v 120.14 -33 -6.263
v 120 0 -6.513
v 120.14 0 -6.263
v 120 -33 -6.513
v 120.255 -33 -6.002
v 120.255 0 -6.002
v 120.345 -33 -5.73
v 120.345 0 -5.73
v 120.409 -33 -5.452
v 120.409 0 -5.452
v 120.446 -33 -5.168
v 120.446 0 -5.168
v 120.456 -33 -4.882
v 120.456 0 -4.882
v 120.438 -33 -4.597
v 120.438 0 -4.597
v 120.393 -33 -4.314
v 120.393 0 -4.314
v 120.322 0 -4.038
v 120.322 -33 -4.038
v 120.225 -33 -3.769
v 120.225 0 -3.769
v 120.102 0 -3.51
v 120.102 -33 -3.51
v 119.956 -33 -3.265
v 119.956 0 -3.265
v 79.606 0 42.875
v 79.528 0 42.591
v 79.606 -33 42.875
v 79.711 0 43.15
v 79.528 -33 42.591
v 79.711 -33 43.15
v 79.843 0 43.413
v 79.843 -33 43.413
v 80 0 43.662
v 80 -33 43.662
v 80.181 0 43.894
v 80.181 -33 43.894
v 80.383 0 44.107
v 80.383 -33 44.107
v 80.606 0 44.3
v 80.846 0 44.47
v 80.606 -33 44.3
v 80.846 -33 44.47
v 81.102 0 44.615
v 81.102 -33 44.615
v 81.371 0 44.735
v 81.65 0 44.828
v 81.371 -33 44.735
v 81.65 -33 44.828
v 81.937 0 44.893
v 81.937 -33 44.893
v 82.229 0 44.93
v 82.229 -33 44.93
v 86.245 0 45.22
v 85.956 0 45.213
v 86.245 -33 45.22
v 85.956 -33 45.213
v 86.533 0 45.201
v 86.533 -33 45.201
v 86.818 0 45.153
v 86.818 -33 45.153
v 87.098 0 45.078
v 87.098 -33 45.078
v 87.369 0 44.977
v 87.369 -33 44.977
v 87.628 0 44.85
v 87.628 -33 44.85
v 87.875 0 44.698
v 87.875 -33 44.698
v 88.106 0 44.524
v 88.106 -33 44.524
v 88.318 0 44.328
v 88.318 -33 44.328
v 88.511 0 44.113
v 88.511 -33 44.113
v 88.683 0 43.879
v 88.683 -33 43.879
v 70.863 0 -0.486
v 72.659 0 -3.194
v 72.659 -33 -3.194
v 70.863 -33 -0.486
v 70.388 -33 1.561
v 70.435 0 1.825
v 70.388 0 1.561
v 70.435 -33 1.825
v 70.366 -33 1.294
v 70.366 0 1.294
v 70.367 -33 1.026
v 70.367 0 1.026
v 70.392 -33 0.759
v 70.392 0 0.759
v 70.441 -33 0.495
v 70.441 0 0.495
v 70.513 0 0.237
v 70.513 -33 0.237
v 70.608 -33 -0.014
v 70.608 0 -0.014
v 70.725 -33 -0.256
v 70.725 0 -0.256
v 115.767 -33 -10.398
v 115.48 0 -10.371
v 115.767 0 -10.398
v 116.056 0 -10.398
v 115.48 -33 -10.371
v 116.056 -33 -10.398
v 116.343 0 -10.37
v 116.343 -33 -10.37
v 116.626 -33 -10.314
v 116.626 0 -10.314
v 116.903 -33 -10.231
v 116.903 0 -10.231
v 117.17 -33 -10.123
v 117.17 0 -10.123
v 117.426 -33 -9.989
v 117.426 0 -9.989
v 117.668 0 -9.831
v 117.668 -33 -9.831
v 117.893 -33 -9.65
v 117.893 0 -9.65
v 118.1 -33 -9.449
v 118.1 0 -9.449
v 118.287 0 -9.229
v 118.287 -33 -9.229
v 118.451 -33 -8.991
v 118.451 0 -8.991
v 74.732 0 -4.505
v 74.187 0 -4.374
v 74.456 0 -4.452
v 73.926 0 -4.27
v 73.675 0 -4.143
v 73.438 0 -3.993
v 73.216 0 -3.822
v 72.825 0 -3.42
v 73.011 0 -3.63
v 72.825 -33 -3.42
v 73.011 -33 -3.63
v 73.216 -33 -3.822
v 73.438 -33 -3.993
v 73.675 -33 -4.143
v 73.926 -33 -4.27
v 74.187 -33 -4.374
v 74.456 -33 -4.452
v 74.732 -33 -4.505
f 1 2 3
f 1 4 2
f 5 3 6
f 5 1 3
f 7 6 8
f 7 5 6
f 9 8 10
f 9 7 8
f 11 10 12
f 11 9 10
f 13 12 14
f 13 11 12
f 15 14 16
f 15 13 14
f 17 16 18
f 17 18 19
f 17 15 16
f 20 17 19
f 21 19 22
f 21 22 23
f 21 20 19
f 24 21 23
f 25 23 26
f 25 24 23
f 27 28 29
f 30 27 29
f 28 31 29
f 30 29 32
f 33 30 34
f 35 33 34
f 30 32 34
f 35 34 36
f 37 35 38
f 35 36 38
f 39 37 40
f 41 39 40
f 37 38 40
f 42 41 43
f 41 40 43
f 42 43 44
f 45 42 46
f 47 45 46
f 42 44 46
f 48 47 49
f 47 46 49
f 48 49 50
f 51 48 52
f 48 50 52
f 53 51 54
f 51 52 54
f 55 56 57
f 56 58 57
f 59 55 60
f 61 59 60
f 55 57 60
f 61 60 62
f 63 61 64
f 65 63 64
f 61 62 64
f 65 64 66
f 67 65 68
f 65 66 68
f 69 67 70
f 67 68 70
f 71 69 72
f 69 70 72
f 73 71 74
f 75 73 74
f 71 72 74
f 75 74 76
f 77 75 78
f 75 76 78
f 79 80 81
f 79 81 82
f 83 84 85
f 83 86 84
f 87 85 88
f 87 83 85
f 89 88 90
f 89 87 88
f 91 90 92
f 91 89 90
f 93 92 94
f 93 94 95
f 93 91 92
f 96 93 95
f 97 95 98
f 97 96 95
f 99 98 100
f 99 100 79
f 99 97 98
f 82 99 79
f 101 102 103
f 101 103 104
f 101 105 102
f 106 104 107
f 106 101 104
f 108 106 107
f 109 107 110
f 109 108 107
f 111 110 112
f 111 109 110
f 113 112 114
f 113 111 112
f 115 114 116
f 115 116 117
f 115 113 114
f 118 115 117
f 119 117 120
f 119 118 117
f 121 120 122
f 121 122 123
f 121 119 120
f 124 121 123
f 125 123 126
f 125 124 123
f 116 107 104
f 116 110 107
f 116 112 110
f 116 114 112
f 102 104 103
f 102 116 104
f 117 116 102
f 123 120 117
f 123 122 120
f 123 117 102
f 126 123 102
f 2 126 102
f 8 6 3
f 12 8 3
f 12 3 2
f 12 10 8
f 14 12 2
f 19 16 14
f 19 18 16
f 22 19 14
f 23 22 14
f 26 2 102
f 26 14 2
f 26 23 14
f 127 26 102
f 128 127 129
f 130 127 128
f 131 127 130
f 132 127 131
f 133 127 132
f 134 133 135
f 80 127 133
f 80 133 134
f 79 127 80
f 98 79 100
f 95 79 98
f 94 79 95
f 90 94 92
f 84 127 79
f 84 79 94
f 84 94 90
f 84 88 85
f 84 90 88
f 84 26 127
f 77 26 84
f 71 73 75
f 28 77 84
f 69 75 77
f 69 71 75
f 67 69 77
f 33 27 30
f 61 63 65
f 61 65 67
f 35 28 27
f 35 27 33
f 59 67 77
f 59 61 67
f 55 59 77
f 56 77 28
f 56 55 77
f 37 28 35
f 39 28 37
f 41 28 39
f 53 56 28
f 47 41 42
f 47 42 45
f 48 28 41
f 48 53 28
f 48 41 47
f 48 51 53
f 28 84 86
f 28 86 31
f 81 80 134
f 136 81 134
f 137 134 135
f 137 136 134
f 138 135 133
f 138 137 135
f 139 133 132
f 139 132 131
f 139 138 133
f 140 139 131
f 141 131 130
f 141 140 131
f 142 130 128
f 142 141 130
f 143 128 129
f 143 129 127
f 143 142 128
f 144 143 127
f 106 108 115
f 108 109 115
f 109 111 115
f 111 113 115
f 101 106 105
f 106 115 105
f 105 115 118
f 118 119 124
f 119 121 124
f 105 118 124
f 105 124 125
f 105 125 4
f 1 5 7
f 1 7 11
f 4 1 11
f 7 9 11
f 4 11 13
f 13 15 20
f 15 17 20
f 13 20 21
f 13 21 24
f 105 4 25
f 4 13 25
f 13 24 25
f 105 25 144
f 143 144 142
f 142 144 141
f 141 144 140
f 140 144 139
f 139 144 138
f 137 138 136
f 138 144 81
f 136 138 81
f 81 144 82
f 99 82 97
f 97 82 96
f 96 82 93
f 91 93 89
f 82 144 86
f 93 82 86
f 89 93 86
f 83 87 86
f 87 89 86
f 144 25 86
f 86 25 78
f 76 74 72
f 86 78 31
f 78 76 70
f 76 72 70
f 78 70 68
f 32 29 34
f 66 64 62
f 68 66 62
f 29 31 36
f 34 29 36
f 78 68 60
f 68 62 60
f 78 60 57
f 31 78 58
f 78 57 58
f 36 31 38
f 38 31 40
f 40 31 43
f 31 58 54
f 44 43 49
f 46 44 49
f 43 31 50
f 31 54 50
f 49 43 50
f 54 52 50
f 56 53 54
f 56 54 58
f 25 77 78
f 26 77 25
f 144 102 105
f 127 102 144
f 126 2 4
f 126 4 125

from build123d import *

# Parameters (mm, degrees)
PAD018_DEPTH = 33
FILLET019_R  = 3
FILLET020_R  = 3


with BuildPart() as fillet020:
    # Sketch023 → Pad018 (new body)
    with BuildSketch(Plane(origin=(0, 0, 0), x_dir=(0.848048, 0, 0.529919), z_dir=(0, -1, 0))):
        Polygon((-40.765351, 19.72502), (-40.765351, 12.915253), (-0.082344, -5.035194), (5.261885, -2.605449), (20.317712, 40.085552), (14.098928, 44.660699), align=None)
    extrude(amount=PAD018_DEPTH)

    # Fillet019
    fillet019_edges = [fillet020.edges().sort_by_distance(p)[0] for p in [
        (-4.011709, -16.5, 44.761223),
        (-11.709995, -16.5, 45.345714),
    ]]
    fillet(fillet019_edges, radius=FILLET019_R)

    # Fillet020
    fillet020_edges = [fillet020.edges().sort_by_distance(p)[0] for p in [
        (5.843009, -16.5, 0.578828),
        (2.598414, -16.5, -4.313722),
        (-41.41502, -16.5, -10.649589),
        (-45.023647, -16.5, -4.874579),
    ]]
    fillet(fillet020_edges, radius=FILLET020_R)


with BuildPart() as part_mirroring015:
    # Part__Mirroring015: instance of Fillet020
    add(fillet020.part.mirror(Plane(origin=(0, 0, 0), x_dir=(0, -1, 0), z_dir=(1, 0, 0))))


with BuildPart() as part_mirroring015_1:
    # Part__Mirroring015 placement: moved
    add(part_mirroring015.part.moved(Location((76, 0, 0))))


solid = part_mirroring015_1.part
